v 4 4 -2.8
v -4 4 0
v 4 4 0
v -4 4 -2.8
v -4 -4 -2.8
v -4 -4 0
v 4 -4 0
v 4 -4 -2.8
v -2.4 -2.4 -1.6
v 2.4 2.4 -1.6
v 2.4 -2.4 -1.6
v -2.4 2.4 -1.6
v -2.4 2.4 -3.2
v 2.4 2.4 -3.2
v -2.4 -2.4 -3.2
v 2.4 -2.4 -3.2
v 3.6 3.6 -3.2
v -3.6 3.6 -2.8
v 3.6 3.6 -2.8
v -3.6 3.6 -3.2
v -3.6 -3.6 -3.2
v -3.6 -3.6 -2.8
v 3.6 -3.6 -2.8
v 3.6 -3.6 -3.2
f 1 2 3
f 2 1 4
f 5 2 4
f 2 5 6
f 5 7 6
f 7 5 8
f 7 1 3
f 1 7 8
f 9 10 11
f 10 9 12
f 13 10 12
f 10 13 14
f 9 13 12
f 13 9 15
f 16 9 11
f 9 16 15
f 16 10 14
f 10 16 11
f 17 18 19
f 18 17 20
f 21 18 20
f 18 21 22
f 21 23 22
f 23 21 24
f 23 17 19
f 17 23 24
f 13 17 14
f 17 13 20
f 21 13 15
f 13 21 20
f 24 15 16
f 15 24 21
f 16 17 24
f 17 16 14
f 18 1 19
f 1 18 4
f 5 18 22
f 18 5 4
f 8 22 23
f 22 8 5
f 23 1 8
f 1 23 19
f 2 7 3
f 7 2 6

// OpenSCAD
// file: ../p/box5.scad
use <../lib.scad>
function ldraw_lib__box5() = [
// 0 Box with 5 Faces and All Edges
// 0 Name: box5.dat
// 0 Author: James Jessiman
// 0 !LDRAW_ORG Primitive UPDATE 2012-01
// 0 !LICENSE Licensed under CC BY 2.0 and CC BY 4.0 : see CAreadme.txt
// 
// 0 BFC CERTIFY CCW
  [0,"BFC","CERTIFY"],
  [0,"BFC","CCW"],
// 
// 0 !HISTORY 2002-04-03 [sbliss] Modified for BFC compliance
// 0 !HISTORY 2002-04-25 [PTadmin] Official Update 2002-02
// 0 !HISTORY 2007-06-24 [PTadmin] Header formatted for Contributor Agreement
// 0 !HISTORY 2008-07-01 [PTadmin] Official Update 2008-01
// 0 !HISTORY 2012-02-16 [Philo] Changed to CCW
// 0 !HISTORY 2012-03-30 [PTadmin] Official Update 2012-01
// 
// 
// 2 24 1 1 1 -1 1 1
  [2,24,1,1,1,-1,1,1],
// 2 24 -1 1 1 -1 1 -1
  [2,24,-1,1,1,-1,1,-1],
// 2 24 -1 1 -1 1 1 -1
  [2,24,-1,1,-1,1,1,-1],
// 2 24 1 1 -1 1 1 1
  [2,24,1,1,-1,1,1,1],
// 2 24 1 0 1 -1 0 1
  [2,24,1,0,1,-1,0,1],
// 2 24 -1 0 1 -1 0 -1
  [2,24,-1,0,1,-1,0,-1],
// 2 24 -1 0 -1 1 0 -1
  [2,24,-1,0,-1,1,0,-1],
// 2 24 1 0 -1 1 0 1
  [2,24,1,0,-1,1,0,1],
// 2 24 1 0 1 1 1 1
  [2,24,1,0,1,1,1,1],
// 2 24 -1 0 1 -1 1 1
  [2,24,-1,0,1,-1,1,1],
// 2 24 1 0 -1 1 1 -1
  [2,24,1,0,-1,1,1,-1],
// 2 24 -1 0 -1 -1 1 -1
  [2,24,-1,0,-1,-1,1,-1],
// 4 16 -1 1 1 1 1 1 1 1 -1 -1 1 -1
  [4,16,-1,1,1,1,1,1,1,1,-1,-1,1,-1],
// 4 16 -1 1 1 -1 0 1 1 0 1 1 1 1
  [4,16,-1,1,1,-1,0,1,1,0,1,1,1,1],
// 4 16 -1 1 -1 -1 0 -1 -1 0 1 -1 1 1
  [4,16,-1,1,-1,-1,0,-1,-1,0,1,-1,1,1],
// 4 16 1 1 -1 1 0 -1 -1 0 -1 -1 1 -1
  [4,16,1,1,-1,1,0,-1,-1,0,-1,-1,1,-1],
// 4 16 1 1 1 1 0 1 1 0 -1 1 1 -1
  [4,16,1,1,1,1,0,1,1,0,-1,1,1,-1],
];
makepoly(ldraw_lib__box5(), line=0.2);
// file: ../p/box4.scad
use <../lib.scad>
function ldraw_lib__box4() = [
// 0 Box with 4 Faces (2 Parallel Pairs) and All Edges
// 0 Name: box4.dat
// 0 Author: James Jessiman
// 0 !LDRAW_ORG Primitive UPDATE 2012-01
// 0 !LICENSE Licensed under CC BY 2.0 and CC BY 4.0 : see CAreadme.txt
// 
// 0 BFC CERTIFY CCW
  [0,"BFC","CERTIFY"],
  [0,"BFC","CCW"],
// 
// 0 !HISTORY 2002-04-03 [sbliss] Modified for BFC compliance
// 0 !HISTORY 2002-04-25 [PTadmin] Official Update 2002-02
// 0 !HISTORY 2007-06-24 [PTadmin] Header formatted for Contributor Agreement
// 0 !HISTORY 2008-07-01 [PTadmin] Official Update 2008-01
// 0 !HISTORY 2012-02-16 [Philo] Changed to CCW
// 0 !HISTORY 2012-03-30 [PTadmin] Official Update 2012-01
// 
// 
// 2 24 1 1 1 -1 1 1
  [2,24,1,1,1,-1,1,1],
// 2 24 -1 1 1 -1 1 -1
  [2,24,-1,1,1,-1,1,-1],
// 2 24 -1 1 -1 1 1 -1
  [2,24,-1,1,-1,1,1,-1],
// 2 24 1 1 -1 1 1 1
  [2,24,1,1,-1,1,1,1],
// 2 24 1 0 1 -1 0 1
  [2,24,1,0,1,-1,0,1],
// 2 24 -1 0 1 -1 0 -1
  [2,24,-1,0,1,-1,0,-1],
// 2 24 -1 0 -1 1 0 -1
  [2,24,-1,0,-1,1,0,-1],
// 2 24 1 0 -1 1 0 1
  [2,24,1,0,-1,1,0,1],
// 2 24 1 0 1 1 1 1
  [2,24,1,0,1,1,1,1],
// 2 24 -1 0 1 -1 1 1
  [2,24,-1,0,1,-1,1,1],
// 2 24 1 0 -1 1 1 -1
  [2,24,1,0,-1,1,1,-1],
// 2 24 -1 0 -1 -1 1 -1
  [2,24,-1,0,-1,-1,1,-1],
// 4 16 -1 1 1 -1 0 1 1 0 1 1 1 1
  [4,16,-1,1,1,-1,0,1,1,0,1,1,1,1],
// 4 16 -1 1 -1 -1 0 -1 -1 0 1 -1 1 1
  [4,16,-1,1,-1,-1,0,-1,-1,0,1,-1,1,1],
// 4 16 1 1 -1 1 0 -1 -1 0 -1 -1 1 -1
  [4,16,1,1,-1,1,0,-1,-1,0,-1,-1,1,-1],
// 4 16 1 1 1 1 0 1 1 0 -1 1 1 -1
  [4,16,1,1,1,1,0,1,1,0,-1,1,1,-1],
];
makepoly(ldraw_lib__box4(), line=0.2);
// file: s/3070bs01.scad
use <../../lib.scad>
use <../../p/box4.scad>
use <../../p/box5.scad>
function ldraw_lib__s__3070bs01() = [
// 0 ~Tile  1 x  1 with Groove without Top Face
// 0 Name: s\3070bs01.dat
// 0 Author: Chris Dee [cwdee]
// 0 !LDRAW_ORG Subpart UPDATE 2009-02
// 0 !LICENSE Licensed under CC BY 2.0 and CC BY 4.0 : see CAreadme.txt
// 
// 0 BFC CERTIFY CCW
  [0,"BFC","CERTIFY"],
  [0,"BFC","CCW"],
// 
// 0 !HISTORY 2009-09-03 [PTadmin] Official Update 2009-02
// 
// 
// 1 16 0 0 0 10 0 0 0 7 0 0 0 10 box4.dat
  [1,16,0,0,0,10,0,0,0,7,0,0,0,10, ldraw_lib__box4()],
// 0 BFC INVERTNEXT
  [0,"BFC","INVERTNEXT"],
// 1 16 0 8 0 6 0 0 0 -4 0 0 0 6 box5.dat
  [1,16,0,8,0,6,0,0,0,-4,0,0,0,6, ldraw_lib__box5()],
// 1 16 0 7 0 9 0 0 0 1 0 0 0 9 box4.dat
  [1,16,0,7,0,9,0,0,0,1,0,0,0,9, ldraw_lib__box4()],
// 
// 4 16 9 8 9 6 8 6 -6 8 6 -9 8 9
  [4,16,9,8,9,6,8,6,-6,8,6,-9,8,9],
// 4 16 -9 8 9 -6 8 6 -6 8 -6 -9 8 -9
  [4,16,-9,8,9,-6,8,6,-6,8,-6,-9,8,-9],
// 4 16 -9 8 -9 -6 8 -6 6 8 -6 9 8 -9
  [4,16,-9,8,-9,-6,8,-6,6,8,-6,9,8,-9],
// 4 16 9 8 -9 6 8 -6 6 8 6 9 8 9
  [4,16,9,8,-9,6,8,-6,6,8,6,9,8,9],
// 
// 4 16 10 7 10 9 7 9 -9 7 9 -10 7 10
  [4,16,10,7,10,9,7,9,-9,7,9,-10,7,10],
// 4 16 -10 7 10 -9 7 9 -9 7 -9 -10 7 -10
  [4,16,-10,7,10,-9,7,9,-9,7,-9,-10,7,-10],
// 4 16 -10 7 -10 -9 7 -9 9 7 -9 10 7 -10
  [4,16,-10,7,-10,-9,7,-9,9,7,-9,10,7,-10],
// 4 16 10 7 -10 9 7 -9 9 7 9 10 7 10
  [4,16,10,7,-10,9,7,-9,9,7,9,10,7,10],
// 0
];
makepoly(ldraw_lib__s__3070bs01(), line=0.2);
// file: 3070b.scad
use <../lib.scad>
use <s/3070bs01.scad>
function ldraw_lib__3070b() = [
// 0 Tile  1 x  1 with Groove
// 0 Name: 3070b.dat
// 0 Author: Chris Dee [cwdee]
// 0 !LDRAW_ORG Part UPDATE 2009-02
// 0 !LICENSE Licensed under CC BY 2.0 and CC BY 4.0 : see CAreadme.txt
// 
// 0 BFC CERTIFY CW
  [0,"BFC","CERTIFY"],
  [0,"BFC","CW"],
// 
// 0 !HISTORY 2009-09-03 [PTadmin] Official Update 2009-02
// 
// 
// 1 16 0 0 0 1 0 0 0 1 0 0 0 1 s\3070bs01.dat
  [1,16,0,0,0,1,0,0,0,1,0,0,0,1, ldraw_lib__s__3070bs01()],
// 4 16 10 0 10 10 0 -10 -10 0 -10 -10 0 10
  [4,16,10,0,10,10,0,-10,-10,0,-10,-10,0,10],
// 0
];
makepoly(ldraw_lib__3070b(), line=0.2);
// main file
use <../lib.scad>
use <3070b.scad>
function ldraw_lib__4216384() = [
// 0 ~_Tile  1 x  1 with Groove Trans Green (Obsolete)
// 0 Name: 4216384.dat
// 0 Author: [PTadmin]
// 0 !LDRAW_ORG Part Physical_Colour UPDATE 2019-02
// 0 !LICENSE Licensed under CC BY 2.0 and CC BY 4.0 : see CAreadme.txt
// 
// 0 BFC CERTIFY CCW
  [0,"BFC","CERTIFY"],
  [0,"BFC","CCW"],
// 
// 0 !HISTORY 2010-12-31 [PTadmin] Official Update 2010-03
// 0 !HISTORY 2019-08-16 [Holly-Wood] Obsoleted per decision not to include physical colour parts
// 0 !HISTORY 2019-09-09 [PTadmin] Official Update 2019-02
// 
// 
// 0 // This file is a "shortcut" with the correct number for the actual
// 0 // colouring of the part (Trans Green).
// 
// 1 34 0 0 0 1 0 0 0 1 0 0 0 1 3070b.dat
  [1,34,0,0,0,1,0,0,0,1,0,0,0,1, ldraw_lib__3070b()],
];
makepoly(ldraw_lib__4216384(), line=0.2);
